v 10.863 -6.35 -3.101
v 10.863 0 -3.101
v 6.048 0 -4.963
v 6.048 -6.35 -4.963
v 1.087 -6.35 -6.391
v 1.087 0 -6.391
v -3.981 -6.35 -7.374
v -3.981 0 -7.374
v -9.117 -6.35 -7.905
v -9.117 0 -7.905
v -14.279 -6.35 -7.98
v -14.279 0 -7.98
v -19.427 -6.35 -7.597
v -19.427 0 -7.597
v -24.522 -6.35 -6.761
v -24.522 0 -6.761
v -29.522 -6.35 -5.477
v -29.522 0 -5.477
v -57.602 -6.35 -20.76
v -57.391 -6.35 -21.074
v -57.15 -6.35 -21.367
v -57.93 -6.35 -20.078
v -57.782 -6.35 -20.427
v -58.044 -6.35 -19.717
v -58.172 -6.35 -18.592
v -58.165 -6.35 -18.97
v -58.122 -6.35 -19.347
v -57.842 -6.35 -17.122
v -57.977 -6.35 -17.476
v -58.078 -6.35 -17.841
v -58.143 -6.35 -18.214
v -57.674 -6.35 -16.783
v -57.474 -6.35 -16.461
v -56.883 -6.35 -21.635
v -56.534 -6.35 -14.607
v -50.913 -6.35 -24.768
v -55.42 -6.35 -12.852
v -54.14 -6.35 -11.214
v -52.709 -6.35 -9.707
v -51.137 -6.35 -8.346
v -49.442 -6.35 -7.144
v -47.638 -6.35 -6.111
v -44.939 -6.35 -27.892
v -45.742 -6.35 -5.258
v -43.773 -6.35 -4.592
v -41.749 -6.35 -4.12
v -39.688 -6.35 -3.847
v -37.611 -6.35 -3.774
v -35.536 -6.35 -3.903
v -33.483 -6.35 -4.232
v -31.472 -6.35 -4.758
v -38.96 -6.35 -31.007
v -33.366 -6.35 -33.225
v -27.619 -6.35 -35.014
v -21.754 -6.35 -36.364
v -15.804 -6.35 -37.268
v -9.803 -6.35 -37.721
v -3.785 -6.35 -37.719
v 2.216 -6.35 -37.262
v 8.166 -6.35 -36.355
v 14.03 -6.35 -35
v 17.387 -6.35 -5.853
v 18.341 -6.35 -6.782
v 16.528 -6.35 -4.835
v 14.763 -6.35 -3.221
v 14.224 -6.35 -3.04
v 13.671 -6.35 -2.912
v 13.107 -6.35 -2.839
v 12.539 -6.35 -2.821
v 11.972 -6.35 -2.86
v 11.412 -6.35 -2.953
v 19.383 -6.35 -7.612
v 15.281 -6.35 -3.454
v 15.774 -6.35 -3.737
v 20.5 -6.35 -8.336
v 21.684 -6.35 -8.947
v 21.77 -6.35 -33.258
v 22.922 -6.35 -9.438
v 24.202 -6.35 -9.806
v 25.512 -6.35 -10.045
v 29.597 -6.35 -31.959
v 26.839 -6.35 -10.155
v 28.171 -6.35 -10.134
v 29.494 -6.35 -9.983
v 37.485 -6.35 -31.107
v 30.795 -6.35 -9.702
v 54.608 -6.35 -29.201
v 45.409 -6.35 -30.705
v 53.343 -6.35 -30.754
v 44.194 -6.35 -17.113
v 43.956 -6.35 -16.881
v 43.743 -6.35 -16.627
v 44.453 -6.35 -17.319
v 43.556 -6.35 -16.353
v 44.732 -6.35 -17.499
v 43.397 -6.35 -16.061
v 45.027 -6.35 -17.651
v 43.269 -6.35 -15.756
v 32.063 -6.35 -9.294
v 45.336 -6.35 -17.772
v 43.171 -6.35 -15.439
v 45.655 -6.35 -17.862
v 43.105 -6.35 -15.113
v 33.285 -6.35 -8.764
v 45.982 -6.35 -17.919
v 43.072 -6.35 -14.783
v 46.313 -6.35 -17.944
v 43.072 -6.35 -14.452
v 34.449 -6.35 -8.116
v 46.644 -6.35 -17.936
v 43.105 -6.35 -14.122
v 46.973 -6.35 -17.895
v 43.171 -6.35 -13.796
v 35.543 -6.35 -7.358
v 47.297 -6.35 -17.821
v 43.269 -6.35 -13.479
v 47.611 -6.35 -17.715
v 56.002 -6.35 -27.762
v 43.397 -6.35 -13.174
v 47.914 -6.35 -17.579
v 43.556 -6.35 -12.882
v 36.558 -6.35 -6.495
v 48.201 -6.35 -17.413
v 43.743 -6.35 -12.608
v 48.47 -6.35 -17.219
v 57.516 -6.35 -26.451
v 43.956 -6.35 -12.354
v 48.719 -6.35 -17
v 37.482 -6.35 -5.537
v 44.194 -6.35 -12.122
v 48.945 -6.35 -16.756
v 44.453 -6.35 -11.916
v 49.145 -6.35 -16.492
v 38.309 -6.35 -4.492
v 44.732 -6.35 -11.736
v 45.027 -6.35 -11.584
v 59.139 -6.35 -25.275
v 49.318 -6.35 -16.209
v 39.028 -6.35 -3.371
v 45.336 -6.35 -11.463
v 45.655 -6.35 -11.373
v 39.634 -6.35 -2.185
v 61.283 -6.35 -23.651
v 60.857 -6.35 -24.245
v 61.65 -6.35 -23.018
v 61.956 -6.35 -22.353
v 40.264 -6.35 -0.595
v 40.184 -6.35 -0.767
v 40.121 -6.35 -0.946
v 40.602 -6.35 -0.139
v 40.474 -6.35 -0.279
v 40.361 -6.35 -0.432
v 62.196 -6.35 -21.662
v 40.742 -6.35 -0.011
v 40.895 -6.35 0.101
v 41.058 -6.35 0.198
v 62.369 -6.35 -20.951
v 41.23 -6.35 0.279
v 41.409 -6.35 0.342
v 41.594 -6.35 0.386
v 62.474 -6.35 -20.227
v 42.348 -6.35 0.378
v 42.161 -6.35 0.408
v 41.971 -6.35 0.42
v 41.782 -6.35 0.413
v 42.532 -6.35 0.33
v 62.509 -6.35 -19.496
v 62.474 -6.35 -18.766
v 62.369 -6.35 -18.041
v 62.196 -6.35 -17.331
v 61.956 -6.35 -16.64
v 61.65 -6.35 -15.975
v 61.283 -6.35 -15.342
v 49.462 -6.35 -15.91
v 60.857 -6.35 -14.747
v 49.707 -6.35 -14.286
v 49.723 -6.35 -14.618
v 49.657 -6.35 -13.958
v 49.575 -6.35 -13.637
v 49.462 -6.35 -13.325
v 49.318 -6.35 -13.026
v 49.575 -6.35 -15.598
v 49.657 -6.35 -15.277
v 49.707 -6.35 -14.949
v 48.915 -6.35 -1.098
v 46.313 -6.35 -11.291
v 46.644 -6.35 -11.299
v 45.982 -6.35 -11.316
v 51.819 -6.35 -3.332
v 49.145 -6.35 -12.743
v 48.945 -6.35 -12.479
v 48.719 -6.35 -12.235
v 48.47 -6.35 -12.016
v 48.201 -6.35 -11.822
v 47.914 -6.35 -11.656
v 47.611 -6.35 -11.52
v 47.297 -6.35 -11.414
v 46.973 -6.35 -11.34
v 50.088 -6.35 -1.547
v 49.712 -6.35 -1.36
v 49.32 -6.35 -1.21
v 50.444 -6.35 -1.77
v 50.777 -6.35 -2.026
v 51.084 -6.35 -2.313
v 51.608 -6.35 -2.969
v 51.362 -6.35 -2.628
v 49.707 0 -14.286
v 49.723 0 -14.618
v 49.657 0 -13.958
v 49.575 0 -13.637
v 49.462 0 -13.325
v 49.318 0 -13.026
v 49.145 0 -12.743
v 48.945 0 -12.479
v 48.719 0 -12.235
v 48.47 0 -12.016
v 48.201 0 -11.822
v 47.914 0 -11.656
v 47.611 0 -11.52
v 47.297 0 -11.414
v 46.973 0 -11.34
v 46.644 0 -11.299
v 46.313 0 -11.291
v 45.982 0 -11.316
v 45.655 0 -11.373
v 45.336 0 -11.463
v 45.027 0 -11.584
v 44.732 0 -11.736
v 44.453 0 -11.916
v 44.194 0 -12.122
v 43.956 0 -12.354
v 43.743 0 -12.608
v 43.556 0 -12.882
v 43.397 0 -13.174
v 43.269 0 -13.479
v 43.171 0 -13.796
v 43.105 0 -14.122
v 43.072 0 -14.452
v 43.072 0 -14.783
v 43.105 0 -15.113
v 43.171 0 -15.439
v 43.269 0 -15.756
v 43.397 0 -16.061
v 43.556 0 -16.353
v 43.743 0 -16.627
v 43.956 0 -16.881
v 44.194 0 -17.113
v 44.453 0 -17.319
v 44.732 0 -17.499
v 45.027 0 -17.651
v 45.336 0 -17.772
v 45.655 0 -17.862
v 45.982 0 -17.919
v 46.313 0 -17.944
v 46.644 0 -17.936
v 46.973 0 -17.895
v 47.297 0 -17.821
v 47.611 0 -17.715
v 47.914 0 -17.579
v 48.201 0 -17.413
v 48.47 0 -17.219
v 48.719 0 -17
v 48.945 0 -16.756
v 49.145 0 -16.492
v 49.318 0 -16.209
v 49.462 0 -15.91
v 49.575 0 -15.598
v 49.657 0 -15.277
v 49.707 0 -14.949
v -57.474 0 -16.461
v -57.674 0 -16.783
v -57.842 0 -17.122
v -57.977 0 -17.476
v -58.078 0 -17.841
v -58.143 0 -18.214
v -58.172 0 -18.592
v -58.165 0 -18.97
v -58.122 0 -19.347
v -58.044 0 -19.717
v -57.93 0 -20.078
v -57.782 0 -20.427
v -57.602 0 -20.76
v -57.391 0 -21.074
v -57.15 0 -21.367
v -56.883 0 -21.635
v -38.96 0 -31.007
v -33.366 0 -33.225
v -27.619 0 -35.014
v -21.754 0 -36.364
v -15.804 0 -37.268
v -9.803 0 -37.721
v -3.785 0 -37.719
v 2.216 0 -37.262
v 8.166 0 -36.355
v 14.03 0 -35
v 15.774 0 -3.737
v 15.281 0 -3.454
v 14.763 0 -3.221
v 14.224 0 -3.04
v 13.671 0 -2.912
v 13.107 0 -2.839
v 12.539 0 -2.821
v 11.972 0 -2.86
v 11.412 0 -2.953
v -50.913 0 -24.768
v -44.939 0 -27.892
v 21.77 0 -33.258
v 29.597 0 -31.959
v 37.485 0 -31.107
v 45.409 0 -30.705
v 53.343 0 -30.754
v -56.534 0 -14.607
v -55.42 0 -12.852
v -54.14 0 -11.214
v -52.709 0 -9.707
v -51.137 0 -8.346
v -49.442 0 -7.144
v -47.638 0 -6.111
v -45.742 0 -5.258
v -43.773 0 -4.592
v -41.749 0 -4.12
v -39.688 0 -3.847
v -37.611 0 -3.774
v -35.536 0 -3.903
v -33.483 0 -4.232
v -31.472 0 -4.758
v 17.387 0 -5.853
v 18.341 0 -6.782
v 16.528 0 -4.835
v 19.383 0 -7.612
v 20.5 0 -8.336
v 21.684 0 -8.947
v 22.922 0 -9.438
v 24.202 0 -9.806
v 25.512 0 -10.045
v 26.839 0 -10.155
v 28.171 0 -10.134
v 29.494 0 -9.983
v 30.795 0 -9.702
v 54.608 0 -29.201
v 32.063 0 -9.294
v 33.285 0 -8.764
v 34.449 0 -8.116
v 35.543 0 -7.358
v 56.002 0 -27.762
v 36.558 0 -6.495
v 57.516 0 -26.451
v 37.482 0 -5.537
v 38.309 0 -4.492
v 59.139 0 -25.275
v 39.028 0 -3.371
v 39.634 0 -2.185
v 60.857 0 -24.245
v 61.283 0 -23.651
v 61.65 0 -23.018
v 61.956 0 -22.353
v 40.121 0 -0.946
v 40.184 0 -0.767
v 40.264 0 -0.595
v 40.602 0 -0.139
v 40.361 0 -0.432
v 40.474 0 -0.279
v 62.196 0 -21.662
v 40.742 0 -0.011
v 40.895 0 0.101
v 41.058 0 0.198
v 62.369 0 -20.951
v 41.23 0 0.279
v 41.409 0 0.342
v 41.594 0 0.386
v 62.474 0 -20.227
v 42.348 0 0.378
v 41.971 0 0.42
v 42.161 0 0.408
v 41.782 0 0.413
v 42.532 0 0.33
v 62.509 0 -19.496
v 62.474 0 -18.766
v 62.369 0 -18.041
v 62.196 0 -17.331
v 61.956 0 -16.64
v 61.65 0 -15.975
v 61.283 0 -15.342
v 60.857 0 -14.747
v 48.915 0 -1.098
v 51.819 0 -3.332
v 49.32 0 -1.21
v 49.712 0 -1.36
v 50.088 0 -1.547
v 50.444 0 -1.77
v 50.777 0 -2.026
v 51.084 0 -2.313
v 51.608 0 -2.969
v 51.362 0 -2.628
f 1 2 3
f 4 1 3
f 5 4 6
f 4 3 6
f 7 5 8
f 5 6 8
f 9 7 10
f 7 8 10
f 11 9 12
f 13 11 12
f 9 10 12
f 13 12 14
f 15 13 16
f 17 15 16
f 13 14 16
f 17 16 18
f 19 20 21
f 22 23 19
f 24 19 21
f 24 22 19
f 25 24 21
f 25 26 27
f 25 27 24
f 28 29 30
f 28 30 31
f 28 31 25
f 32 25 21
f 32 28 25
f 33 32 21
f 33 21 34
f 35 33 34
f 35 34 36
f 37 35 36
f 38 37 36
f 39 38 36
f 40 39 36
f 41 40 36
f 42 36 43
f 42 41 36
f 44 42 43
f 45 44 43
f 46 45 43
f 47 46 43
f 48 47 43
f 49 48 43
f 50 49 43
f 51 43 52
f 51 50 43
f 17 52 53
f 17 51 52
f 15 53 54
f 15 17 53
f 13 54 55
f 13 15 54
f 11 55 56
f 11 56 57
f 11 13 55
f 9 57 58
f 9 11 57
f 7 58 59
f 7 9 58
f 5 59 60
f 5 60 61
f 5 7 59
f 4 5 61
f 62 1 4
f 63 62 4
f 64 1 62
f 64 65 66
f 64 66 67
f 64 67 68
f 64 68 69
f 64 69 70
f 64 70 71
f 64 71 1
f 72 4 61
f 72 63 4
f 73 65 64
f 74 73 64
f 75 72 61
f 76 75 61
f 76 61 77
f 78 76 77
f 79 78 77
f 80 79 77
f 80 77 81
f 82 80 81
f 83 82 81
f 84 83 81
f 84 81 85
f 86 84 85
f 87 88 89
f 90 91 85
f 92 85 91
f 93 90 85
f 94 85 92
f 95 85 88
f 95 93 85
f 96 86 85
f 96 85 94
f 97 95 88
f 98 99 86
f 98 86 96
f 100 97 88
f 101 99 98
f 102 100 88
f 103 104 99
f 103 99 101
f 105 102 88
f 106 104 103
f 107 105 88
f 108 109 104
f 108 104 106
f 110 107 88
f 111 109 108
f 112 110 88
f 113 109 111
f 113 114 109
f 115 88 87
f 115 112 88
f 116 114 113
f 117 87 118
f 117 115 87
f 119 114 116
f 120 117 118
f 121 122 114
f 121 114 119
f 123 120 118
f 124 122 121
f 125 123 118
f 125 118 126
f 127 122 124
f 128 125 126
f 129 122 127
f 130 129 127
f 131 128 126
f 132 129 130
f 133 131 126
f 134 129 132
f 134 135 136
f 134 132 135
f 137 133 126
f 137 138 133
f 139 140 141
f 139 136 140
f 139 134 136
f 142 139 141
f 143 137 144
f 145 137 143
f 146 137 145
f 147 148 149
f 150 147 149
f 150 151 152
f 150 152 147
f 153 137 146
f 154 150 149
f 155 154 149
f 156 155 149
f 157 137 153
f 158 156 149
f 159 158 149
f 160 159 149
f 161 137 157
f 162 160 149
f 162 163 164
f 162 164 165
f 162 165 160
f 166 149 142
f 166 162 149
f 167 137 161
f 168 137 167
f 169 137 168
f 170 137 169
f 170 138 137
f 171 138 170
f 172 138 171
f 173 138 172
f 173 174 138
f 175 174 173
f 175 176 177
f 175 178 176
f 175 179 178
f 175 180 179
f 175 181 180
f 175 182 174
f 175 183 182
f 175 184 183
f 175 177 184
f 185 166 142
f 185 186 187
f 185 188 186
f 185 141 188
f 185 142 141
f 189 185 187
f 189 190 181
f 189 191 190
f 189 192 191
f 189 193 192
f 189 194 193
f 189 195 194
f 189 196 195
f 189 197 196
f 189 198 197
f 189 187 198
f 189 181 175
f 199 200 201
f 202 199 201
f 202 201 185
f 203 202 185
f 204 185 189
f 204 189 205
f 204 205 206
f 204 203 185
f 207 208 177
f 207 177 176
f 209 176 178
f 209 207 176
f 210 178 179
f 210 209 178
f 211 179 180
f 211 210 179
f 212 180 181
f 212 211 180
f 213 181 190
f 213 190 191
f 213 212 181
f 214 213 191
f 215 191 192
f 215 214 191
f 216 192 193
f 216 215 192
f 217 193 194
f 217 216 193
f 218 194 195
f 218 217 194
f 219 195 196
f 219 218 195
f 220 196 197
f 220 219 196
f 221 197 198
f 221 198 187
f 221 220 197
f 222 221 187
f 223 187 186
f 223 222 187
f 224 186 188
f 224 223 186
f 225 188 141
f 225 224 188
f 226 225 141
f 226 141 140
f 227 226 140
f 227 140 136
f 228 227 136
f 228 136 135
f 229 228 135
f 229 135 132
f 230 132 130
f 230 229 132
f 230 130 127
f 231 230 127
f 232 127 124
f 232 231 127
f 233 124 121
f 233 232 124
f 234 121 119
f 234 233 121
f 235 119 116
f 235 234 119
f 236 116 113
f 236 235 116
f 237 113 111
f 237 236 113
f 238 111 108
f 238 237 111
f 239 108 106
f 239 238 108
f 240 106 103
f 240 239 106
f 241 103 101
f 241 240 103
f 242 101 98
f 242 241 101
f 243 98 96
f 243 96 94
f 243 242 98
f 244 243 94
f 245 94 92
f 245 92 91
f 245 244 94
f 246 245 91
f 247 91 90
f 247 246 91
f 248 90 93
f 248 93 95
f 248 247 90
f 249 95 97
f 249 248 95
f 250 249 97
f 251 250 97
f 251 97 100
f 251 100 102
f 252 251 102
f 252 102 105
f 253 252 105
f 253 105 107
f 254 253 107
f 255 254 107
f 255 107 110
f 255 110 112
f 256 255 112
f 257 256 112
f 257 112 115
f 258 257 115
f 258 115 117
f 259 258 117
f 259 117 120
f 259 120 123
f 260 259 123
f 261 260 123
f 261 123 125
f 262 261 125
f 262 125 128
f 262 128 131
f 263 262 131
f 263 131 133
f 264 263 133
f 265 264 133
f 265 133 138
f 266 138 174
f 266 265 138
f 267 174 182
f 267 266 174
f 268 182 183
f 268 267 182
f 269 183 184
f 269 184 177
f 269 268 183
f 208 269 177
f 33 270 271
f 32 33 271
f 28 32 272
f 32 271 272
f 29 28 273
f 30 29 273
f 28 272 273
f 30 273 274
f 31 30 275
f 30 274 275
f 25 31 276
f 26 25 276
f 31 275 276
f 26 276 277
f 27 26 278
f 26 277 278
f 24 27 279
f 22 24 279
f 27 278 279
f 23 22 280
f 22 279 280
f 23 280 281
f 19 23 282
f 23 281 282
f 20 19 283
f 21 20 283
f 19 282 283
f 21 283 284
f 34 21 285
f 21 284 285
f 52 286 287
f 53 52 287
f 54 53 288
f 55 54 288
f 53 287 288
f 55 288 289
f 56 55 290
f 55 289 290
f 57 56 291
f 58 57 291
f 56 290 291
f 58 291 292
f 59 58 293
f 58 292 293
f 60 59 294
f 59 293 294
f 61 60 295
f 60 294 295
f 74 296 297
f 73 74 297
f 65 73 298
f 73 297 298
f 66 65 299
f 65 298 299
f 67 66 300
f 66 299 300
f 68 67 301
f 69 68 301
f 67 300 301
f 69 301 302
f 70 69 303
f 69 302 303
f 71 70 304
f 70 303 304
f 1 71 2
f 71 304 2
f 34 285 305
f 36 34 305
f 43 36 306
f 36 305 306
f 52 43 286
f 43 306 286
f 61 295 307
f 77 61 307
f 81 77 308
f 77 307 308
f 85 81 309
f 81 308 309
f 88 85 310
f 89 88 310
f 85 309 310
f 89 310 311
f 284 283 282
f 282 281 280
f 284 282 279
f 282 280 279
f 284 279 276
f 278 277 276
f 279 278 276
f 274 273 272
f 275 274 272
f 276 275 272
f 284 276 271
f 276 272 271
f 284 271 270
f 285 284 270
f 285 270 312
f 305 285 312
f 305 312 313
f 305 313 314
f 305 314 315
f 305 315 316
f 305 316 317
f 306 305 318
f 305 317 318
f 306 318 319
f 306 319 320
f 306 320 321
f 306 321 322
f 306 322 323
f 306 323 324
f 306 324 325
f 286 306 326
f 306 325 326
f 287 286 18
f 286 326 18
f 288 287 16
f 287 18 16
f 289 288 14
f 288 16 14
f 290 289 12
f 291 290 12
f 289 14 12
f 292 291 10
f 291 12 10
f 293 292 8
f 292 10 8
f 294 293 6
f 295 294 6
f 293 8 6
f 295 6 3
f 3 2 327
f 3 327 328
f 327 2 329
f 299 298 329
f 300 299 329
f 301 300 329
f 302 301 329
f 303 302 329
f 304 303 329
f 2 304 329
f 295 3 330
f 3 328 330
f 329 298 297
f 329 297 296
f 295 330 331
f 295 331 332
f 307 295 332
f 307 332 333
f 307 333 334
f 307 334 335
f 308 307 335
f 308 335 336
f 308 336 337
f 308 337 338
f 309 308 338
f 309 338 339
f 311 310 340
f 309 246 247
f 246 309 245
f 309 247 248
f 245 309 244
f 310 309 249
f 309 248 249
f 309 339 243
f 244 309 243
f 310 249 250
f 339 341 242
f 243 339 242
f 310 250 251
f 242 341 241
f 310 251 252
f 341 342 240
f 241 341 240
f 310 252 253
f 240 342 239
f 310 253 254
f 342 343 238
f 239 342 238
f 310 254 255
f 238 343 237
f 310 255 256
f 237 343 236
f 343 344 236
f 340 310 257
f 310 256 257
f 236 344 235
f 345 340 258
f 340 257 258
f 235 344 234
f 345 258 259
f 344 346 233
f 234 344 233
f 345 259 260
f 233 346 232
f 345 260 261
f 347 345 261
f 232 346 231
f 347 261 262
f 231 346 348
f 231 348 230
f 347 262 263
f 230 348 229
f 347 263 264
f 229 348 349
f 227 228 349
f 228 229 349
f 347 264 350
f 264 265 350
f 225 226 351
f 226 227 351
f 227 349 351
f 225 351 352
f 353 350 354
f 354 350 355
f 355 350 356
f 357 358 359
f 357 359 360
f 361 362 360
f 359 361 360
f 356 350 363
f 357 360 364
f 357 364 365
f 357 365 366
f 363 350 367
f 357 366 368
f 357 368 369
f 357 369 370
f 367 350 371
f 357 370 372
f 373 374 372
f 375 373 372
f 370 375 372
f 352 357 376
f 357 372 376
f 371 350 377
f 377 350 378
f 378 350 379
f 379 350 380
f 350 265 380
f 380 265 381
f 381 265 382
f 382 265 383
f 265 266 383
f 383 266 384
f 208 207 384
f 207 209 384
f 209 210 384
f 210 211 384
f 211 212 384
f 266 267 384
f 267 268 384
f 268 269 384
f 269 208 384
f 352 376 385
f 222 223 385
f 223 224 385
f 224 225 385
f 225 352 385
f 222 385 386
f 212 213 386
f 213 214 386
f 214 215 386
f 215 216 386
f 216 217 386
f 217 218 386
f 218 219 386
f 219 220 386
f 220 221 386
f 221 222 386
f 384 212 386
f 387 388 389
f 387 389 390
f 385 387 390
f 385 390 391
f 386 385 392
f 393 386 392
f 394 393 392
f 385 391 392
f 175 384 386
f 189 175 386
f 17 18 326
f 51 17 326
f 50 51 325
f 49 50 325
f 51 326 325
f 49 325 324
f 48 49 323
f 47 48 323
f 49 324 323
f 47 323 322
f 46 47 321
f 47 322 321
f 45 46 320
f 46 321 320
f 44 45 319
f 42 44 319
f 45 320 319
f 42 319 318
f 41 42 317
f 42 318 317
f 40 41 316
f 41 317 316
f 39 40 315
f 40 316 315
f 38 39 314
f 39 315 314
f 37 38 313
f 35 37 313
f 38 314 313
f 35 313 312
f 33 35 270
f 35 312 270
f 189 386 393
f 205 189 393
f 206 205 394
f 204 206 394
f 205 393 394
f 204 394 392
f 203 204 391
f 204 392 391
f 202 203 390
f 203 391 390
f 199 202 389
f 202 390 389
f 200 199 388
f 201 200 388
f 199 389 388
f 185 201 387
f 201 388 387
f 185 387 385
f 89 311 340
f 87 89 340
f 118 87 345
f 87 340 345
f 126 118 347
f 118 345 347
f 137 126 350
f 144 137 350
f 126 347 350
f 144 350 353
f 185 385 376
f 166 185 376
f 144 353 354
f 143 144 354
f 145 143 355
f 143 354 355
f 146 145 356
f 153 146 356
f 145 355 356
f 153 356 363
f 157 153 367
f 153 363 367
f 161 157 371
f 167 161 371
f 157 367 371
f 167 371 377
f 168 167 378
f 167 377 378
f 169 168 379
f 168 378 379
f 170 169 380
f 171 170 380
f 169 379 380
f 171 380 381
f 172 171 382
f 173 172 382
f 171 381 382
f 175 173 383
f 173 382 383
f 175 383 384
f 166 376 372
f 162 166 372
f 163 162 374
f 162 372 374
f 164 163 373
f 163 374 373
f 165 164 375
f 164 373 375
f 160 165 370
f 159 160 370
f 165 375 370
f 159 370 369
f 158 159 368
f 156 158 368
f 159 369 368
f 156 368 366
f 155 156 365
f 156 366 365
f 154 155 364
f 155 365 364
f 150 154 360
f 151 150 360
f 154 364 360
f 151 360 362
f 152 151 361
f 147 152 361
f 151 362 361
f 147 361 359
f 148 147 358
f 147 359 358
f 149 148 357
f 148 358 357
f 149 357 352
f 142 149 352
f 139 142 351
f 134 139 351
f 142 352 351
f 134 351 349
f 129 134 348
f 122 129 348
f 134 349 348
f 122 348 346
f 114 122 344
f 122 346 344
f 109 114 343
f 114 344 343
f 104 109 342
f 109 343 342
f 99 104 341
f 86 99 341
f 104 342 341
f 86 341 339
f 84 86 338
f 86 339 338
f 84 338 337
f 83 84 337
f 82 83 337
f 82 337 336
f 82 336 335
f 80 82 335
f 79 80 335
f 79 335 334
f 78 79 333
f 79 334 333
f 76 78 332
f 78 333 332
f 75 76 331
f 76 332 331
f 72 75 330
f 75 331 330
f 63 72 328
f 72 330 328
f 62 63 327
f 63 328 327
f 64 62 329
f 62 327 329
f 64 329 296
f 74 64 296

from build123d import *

# Parameters (mm, degrees)
F0_R     = 3.32764
F1_DEPTH = 6.35


with BuildPart() as f1:
    # F0 (on Front) → F1 (new body)
    with BuildSketch(Plane.XZ):
        with BuildLine():
            ThreePointArc((10.863197, -3.101384), (-9.116668, -7.905005), (-29.521924, -5.476979))
            ThreePointArc((-29.521924, -5.476979), (-45.742293, -5.257841), (-57.473989, -16.46122))
            ThreePointArc((-57.473989, -16.46122), (-58.148469, -19.15893), (-56.883303, -21.635201))
            ThreePointArc((-56.883303, -21.635201), (-47.926878, -26.330705), (-38.960246, -31.006687))
            ThreePointArc((-38.960246, -31.006687), (-12.808025, -37.551213), (14.029663, -35.000129))
            ThreePointArc((14.029663, -35.000129), (33.535174, -31.476841), (53.343166, -30.754377))
            ThreePointArc((53.343166, -30.754377), (56.744891, -27.089985), (60.856728, -24.245292))
            ThreePointArc((60.856728, -24.245292), (62.508975, -19.496347), (60.856728, -14.747403))
            Line((60.856728, -14.747403), (51.819268, -3.331661))
            ThreePointArc((51.819268, -3.331661), (50.614082, -1.893648), (48.914772, -1.098222))
            Line((48.914772, -1.098222), (42.531531, 0.329607))
            ThreePointArc((42.531531, 0.329607), (41.058171, 0.198446), (40.120659, -0.945698))
            ThreePointArc((40.120659, -0.945698), (28.833955, -10.074921), (15.773744, -3.73747))
            ThreePointArc((15.773744, -3.73747), (13.389868, -2.868245), (10.863197, -3.101384))
        make_face()
        with Locations((46.395506, -14.617501)):
            Circle(F0_R, mode=Mode.SUBTRACT)
    extrude(amount=F1_DEPTH)


solid = f1.part
